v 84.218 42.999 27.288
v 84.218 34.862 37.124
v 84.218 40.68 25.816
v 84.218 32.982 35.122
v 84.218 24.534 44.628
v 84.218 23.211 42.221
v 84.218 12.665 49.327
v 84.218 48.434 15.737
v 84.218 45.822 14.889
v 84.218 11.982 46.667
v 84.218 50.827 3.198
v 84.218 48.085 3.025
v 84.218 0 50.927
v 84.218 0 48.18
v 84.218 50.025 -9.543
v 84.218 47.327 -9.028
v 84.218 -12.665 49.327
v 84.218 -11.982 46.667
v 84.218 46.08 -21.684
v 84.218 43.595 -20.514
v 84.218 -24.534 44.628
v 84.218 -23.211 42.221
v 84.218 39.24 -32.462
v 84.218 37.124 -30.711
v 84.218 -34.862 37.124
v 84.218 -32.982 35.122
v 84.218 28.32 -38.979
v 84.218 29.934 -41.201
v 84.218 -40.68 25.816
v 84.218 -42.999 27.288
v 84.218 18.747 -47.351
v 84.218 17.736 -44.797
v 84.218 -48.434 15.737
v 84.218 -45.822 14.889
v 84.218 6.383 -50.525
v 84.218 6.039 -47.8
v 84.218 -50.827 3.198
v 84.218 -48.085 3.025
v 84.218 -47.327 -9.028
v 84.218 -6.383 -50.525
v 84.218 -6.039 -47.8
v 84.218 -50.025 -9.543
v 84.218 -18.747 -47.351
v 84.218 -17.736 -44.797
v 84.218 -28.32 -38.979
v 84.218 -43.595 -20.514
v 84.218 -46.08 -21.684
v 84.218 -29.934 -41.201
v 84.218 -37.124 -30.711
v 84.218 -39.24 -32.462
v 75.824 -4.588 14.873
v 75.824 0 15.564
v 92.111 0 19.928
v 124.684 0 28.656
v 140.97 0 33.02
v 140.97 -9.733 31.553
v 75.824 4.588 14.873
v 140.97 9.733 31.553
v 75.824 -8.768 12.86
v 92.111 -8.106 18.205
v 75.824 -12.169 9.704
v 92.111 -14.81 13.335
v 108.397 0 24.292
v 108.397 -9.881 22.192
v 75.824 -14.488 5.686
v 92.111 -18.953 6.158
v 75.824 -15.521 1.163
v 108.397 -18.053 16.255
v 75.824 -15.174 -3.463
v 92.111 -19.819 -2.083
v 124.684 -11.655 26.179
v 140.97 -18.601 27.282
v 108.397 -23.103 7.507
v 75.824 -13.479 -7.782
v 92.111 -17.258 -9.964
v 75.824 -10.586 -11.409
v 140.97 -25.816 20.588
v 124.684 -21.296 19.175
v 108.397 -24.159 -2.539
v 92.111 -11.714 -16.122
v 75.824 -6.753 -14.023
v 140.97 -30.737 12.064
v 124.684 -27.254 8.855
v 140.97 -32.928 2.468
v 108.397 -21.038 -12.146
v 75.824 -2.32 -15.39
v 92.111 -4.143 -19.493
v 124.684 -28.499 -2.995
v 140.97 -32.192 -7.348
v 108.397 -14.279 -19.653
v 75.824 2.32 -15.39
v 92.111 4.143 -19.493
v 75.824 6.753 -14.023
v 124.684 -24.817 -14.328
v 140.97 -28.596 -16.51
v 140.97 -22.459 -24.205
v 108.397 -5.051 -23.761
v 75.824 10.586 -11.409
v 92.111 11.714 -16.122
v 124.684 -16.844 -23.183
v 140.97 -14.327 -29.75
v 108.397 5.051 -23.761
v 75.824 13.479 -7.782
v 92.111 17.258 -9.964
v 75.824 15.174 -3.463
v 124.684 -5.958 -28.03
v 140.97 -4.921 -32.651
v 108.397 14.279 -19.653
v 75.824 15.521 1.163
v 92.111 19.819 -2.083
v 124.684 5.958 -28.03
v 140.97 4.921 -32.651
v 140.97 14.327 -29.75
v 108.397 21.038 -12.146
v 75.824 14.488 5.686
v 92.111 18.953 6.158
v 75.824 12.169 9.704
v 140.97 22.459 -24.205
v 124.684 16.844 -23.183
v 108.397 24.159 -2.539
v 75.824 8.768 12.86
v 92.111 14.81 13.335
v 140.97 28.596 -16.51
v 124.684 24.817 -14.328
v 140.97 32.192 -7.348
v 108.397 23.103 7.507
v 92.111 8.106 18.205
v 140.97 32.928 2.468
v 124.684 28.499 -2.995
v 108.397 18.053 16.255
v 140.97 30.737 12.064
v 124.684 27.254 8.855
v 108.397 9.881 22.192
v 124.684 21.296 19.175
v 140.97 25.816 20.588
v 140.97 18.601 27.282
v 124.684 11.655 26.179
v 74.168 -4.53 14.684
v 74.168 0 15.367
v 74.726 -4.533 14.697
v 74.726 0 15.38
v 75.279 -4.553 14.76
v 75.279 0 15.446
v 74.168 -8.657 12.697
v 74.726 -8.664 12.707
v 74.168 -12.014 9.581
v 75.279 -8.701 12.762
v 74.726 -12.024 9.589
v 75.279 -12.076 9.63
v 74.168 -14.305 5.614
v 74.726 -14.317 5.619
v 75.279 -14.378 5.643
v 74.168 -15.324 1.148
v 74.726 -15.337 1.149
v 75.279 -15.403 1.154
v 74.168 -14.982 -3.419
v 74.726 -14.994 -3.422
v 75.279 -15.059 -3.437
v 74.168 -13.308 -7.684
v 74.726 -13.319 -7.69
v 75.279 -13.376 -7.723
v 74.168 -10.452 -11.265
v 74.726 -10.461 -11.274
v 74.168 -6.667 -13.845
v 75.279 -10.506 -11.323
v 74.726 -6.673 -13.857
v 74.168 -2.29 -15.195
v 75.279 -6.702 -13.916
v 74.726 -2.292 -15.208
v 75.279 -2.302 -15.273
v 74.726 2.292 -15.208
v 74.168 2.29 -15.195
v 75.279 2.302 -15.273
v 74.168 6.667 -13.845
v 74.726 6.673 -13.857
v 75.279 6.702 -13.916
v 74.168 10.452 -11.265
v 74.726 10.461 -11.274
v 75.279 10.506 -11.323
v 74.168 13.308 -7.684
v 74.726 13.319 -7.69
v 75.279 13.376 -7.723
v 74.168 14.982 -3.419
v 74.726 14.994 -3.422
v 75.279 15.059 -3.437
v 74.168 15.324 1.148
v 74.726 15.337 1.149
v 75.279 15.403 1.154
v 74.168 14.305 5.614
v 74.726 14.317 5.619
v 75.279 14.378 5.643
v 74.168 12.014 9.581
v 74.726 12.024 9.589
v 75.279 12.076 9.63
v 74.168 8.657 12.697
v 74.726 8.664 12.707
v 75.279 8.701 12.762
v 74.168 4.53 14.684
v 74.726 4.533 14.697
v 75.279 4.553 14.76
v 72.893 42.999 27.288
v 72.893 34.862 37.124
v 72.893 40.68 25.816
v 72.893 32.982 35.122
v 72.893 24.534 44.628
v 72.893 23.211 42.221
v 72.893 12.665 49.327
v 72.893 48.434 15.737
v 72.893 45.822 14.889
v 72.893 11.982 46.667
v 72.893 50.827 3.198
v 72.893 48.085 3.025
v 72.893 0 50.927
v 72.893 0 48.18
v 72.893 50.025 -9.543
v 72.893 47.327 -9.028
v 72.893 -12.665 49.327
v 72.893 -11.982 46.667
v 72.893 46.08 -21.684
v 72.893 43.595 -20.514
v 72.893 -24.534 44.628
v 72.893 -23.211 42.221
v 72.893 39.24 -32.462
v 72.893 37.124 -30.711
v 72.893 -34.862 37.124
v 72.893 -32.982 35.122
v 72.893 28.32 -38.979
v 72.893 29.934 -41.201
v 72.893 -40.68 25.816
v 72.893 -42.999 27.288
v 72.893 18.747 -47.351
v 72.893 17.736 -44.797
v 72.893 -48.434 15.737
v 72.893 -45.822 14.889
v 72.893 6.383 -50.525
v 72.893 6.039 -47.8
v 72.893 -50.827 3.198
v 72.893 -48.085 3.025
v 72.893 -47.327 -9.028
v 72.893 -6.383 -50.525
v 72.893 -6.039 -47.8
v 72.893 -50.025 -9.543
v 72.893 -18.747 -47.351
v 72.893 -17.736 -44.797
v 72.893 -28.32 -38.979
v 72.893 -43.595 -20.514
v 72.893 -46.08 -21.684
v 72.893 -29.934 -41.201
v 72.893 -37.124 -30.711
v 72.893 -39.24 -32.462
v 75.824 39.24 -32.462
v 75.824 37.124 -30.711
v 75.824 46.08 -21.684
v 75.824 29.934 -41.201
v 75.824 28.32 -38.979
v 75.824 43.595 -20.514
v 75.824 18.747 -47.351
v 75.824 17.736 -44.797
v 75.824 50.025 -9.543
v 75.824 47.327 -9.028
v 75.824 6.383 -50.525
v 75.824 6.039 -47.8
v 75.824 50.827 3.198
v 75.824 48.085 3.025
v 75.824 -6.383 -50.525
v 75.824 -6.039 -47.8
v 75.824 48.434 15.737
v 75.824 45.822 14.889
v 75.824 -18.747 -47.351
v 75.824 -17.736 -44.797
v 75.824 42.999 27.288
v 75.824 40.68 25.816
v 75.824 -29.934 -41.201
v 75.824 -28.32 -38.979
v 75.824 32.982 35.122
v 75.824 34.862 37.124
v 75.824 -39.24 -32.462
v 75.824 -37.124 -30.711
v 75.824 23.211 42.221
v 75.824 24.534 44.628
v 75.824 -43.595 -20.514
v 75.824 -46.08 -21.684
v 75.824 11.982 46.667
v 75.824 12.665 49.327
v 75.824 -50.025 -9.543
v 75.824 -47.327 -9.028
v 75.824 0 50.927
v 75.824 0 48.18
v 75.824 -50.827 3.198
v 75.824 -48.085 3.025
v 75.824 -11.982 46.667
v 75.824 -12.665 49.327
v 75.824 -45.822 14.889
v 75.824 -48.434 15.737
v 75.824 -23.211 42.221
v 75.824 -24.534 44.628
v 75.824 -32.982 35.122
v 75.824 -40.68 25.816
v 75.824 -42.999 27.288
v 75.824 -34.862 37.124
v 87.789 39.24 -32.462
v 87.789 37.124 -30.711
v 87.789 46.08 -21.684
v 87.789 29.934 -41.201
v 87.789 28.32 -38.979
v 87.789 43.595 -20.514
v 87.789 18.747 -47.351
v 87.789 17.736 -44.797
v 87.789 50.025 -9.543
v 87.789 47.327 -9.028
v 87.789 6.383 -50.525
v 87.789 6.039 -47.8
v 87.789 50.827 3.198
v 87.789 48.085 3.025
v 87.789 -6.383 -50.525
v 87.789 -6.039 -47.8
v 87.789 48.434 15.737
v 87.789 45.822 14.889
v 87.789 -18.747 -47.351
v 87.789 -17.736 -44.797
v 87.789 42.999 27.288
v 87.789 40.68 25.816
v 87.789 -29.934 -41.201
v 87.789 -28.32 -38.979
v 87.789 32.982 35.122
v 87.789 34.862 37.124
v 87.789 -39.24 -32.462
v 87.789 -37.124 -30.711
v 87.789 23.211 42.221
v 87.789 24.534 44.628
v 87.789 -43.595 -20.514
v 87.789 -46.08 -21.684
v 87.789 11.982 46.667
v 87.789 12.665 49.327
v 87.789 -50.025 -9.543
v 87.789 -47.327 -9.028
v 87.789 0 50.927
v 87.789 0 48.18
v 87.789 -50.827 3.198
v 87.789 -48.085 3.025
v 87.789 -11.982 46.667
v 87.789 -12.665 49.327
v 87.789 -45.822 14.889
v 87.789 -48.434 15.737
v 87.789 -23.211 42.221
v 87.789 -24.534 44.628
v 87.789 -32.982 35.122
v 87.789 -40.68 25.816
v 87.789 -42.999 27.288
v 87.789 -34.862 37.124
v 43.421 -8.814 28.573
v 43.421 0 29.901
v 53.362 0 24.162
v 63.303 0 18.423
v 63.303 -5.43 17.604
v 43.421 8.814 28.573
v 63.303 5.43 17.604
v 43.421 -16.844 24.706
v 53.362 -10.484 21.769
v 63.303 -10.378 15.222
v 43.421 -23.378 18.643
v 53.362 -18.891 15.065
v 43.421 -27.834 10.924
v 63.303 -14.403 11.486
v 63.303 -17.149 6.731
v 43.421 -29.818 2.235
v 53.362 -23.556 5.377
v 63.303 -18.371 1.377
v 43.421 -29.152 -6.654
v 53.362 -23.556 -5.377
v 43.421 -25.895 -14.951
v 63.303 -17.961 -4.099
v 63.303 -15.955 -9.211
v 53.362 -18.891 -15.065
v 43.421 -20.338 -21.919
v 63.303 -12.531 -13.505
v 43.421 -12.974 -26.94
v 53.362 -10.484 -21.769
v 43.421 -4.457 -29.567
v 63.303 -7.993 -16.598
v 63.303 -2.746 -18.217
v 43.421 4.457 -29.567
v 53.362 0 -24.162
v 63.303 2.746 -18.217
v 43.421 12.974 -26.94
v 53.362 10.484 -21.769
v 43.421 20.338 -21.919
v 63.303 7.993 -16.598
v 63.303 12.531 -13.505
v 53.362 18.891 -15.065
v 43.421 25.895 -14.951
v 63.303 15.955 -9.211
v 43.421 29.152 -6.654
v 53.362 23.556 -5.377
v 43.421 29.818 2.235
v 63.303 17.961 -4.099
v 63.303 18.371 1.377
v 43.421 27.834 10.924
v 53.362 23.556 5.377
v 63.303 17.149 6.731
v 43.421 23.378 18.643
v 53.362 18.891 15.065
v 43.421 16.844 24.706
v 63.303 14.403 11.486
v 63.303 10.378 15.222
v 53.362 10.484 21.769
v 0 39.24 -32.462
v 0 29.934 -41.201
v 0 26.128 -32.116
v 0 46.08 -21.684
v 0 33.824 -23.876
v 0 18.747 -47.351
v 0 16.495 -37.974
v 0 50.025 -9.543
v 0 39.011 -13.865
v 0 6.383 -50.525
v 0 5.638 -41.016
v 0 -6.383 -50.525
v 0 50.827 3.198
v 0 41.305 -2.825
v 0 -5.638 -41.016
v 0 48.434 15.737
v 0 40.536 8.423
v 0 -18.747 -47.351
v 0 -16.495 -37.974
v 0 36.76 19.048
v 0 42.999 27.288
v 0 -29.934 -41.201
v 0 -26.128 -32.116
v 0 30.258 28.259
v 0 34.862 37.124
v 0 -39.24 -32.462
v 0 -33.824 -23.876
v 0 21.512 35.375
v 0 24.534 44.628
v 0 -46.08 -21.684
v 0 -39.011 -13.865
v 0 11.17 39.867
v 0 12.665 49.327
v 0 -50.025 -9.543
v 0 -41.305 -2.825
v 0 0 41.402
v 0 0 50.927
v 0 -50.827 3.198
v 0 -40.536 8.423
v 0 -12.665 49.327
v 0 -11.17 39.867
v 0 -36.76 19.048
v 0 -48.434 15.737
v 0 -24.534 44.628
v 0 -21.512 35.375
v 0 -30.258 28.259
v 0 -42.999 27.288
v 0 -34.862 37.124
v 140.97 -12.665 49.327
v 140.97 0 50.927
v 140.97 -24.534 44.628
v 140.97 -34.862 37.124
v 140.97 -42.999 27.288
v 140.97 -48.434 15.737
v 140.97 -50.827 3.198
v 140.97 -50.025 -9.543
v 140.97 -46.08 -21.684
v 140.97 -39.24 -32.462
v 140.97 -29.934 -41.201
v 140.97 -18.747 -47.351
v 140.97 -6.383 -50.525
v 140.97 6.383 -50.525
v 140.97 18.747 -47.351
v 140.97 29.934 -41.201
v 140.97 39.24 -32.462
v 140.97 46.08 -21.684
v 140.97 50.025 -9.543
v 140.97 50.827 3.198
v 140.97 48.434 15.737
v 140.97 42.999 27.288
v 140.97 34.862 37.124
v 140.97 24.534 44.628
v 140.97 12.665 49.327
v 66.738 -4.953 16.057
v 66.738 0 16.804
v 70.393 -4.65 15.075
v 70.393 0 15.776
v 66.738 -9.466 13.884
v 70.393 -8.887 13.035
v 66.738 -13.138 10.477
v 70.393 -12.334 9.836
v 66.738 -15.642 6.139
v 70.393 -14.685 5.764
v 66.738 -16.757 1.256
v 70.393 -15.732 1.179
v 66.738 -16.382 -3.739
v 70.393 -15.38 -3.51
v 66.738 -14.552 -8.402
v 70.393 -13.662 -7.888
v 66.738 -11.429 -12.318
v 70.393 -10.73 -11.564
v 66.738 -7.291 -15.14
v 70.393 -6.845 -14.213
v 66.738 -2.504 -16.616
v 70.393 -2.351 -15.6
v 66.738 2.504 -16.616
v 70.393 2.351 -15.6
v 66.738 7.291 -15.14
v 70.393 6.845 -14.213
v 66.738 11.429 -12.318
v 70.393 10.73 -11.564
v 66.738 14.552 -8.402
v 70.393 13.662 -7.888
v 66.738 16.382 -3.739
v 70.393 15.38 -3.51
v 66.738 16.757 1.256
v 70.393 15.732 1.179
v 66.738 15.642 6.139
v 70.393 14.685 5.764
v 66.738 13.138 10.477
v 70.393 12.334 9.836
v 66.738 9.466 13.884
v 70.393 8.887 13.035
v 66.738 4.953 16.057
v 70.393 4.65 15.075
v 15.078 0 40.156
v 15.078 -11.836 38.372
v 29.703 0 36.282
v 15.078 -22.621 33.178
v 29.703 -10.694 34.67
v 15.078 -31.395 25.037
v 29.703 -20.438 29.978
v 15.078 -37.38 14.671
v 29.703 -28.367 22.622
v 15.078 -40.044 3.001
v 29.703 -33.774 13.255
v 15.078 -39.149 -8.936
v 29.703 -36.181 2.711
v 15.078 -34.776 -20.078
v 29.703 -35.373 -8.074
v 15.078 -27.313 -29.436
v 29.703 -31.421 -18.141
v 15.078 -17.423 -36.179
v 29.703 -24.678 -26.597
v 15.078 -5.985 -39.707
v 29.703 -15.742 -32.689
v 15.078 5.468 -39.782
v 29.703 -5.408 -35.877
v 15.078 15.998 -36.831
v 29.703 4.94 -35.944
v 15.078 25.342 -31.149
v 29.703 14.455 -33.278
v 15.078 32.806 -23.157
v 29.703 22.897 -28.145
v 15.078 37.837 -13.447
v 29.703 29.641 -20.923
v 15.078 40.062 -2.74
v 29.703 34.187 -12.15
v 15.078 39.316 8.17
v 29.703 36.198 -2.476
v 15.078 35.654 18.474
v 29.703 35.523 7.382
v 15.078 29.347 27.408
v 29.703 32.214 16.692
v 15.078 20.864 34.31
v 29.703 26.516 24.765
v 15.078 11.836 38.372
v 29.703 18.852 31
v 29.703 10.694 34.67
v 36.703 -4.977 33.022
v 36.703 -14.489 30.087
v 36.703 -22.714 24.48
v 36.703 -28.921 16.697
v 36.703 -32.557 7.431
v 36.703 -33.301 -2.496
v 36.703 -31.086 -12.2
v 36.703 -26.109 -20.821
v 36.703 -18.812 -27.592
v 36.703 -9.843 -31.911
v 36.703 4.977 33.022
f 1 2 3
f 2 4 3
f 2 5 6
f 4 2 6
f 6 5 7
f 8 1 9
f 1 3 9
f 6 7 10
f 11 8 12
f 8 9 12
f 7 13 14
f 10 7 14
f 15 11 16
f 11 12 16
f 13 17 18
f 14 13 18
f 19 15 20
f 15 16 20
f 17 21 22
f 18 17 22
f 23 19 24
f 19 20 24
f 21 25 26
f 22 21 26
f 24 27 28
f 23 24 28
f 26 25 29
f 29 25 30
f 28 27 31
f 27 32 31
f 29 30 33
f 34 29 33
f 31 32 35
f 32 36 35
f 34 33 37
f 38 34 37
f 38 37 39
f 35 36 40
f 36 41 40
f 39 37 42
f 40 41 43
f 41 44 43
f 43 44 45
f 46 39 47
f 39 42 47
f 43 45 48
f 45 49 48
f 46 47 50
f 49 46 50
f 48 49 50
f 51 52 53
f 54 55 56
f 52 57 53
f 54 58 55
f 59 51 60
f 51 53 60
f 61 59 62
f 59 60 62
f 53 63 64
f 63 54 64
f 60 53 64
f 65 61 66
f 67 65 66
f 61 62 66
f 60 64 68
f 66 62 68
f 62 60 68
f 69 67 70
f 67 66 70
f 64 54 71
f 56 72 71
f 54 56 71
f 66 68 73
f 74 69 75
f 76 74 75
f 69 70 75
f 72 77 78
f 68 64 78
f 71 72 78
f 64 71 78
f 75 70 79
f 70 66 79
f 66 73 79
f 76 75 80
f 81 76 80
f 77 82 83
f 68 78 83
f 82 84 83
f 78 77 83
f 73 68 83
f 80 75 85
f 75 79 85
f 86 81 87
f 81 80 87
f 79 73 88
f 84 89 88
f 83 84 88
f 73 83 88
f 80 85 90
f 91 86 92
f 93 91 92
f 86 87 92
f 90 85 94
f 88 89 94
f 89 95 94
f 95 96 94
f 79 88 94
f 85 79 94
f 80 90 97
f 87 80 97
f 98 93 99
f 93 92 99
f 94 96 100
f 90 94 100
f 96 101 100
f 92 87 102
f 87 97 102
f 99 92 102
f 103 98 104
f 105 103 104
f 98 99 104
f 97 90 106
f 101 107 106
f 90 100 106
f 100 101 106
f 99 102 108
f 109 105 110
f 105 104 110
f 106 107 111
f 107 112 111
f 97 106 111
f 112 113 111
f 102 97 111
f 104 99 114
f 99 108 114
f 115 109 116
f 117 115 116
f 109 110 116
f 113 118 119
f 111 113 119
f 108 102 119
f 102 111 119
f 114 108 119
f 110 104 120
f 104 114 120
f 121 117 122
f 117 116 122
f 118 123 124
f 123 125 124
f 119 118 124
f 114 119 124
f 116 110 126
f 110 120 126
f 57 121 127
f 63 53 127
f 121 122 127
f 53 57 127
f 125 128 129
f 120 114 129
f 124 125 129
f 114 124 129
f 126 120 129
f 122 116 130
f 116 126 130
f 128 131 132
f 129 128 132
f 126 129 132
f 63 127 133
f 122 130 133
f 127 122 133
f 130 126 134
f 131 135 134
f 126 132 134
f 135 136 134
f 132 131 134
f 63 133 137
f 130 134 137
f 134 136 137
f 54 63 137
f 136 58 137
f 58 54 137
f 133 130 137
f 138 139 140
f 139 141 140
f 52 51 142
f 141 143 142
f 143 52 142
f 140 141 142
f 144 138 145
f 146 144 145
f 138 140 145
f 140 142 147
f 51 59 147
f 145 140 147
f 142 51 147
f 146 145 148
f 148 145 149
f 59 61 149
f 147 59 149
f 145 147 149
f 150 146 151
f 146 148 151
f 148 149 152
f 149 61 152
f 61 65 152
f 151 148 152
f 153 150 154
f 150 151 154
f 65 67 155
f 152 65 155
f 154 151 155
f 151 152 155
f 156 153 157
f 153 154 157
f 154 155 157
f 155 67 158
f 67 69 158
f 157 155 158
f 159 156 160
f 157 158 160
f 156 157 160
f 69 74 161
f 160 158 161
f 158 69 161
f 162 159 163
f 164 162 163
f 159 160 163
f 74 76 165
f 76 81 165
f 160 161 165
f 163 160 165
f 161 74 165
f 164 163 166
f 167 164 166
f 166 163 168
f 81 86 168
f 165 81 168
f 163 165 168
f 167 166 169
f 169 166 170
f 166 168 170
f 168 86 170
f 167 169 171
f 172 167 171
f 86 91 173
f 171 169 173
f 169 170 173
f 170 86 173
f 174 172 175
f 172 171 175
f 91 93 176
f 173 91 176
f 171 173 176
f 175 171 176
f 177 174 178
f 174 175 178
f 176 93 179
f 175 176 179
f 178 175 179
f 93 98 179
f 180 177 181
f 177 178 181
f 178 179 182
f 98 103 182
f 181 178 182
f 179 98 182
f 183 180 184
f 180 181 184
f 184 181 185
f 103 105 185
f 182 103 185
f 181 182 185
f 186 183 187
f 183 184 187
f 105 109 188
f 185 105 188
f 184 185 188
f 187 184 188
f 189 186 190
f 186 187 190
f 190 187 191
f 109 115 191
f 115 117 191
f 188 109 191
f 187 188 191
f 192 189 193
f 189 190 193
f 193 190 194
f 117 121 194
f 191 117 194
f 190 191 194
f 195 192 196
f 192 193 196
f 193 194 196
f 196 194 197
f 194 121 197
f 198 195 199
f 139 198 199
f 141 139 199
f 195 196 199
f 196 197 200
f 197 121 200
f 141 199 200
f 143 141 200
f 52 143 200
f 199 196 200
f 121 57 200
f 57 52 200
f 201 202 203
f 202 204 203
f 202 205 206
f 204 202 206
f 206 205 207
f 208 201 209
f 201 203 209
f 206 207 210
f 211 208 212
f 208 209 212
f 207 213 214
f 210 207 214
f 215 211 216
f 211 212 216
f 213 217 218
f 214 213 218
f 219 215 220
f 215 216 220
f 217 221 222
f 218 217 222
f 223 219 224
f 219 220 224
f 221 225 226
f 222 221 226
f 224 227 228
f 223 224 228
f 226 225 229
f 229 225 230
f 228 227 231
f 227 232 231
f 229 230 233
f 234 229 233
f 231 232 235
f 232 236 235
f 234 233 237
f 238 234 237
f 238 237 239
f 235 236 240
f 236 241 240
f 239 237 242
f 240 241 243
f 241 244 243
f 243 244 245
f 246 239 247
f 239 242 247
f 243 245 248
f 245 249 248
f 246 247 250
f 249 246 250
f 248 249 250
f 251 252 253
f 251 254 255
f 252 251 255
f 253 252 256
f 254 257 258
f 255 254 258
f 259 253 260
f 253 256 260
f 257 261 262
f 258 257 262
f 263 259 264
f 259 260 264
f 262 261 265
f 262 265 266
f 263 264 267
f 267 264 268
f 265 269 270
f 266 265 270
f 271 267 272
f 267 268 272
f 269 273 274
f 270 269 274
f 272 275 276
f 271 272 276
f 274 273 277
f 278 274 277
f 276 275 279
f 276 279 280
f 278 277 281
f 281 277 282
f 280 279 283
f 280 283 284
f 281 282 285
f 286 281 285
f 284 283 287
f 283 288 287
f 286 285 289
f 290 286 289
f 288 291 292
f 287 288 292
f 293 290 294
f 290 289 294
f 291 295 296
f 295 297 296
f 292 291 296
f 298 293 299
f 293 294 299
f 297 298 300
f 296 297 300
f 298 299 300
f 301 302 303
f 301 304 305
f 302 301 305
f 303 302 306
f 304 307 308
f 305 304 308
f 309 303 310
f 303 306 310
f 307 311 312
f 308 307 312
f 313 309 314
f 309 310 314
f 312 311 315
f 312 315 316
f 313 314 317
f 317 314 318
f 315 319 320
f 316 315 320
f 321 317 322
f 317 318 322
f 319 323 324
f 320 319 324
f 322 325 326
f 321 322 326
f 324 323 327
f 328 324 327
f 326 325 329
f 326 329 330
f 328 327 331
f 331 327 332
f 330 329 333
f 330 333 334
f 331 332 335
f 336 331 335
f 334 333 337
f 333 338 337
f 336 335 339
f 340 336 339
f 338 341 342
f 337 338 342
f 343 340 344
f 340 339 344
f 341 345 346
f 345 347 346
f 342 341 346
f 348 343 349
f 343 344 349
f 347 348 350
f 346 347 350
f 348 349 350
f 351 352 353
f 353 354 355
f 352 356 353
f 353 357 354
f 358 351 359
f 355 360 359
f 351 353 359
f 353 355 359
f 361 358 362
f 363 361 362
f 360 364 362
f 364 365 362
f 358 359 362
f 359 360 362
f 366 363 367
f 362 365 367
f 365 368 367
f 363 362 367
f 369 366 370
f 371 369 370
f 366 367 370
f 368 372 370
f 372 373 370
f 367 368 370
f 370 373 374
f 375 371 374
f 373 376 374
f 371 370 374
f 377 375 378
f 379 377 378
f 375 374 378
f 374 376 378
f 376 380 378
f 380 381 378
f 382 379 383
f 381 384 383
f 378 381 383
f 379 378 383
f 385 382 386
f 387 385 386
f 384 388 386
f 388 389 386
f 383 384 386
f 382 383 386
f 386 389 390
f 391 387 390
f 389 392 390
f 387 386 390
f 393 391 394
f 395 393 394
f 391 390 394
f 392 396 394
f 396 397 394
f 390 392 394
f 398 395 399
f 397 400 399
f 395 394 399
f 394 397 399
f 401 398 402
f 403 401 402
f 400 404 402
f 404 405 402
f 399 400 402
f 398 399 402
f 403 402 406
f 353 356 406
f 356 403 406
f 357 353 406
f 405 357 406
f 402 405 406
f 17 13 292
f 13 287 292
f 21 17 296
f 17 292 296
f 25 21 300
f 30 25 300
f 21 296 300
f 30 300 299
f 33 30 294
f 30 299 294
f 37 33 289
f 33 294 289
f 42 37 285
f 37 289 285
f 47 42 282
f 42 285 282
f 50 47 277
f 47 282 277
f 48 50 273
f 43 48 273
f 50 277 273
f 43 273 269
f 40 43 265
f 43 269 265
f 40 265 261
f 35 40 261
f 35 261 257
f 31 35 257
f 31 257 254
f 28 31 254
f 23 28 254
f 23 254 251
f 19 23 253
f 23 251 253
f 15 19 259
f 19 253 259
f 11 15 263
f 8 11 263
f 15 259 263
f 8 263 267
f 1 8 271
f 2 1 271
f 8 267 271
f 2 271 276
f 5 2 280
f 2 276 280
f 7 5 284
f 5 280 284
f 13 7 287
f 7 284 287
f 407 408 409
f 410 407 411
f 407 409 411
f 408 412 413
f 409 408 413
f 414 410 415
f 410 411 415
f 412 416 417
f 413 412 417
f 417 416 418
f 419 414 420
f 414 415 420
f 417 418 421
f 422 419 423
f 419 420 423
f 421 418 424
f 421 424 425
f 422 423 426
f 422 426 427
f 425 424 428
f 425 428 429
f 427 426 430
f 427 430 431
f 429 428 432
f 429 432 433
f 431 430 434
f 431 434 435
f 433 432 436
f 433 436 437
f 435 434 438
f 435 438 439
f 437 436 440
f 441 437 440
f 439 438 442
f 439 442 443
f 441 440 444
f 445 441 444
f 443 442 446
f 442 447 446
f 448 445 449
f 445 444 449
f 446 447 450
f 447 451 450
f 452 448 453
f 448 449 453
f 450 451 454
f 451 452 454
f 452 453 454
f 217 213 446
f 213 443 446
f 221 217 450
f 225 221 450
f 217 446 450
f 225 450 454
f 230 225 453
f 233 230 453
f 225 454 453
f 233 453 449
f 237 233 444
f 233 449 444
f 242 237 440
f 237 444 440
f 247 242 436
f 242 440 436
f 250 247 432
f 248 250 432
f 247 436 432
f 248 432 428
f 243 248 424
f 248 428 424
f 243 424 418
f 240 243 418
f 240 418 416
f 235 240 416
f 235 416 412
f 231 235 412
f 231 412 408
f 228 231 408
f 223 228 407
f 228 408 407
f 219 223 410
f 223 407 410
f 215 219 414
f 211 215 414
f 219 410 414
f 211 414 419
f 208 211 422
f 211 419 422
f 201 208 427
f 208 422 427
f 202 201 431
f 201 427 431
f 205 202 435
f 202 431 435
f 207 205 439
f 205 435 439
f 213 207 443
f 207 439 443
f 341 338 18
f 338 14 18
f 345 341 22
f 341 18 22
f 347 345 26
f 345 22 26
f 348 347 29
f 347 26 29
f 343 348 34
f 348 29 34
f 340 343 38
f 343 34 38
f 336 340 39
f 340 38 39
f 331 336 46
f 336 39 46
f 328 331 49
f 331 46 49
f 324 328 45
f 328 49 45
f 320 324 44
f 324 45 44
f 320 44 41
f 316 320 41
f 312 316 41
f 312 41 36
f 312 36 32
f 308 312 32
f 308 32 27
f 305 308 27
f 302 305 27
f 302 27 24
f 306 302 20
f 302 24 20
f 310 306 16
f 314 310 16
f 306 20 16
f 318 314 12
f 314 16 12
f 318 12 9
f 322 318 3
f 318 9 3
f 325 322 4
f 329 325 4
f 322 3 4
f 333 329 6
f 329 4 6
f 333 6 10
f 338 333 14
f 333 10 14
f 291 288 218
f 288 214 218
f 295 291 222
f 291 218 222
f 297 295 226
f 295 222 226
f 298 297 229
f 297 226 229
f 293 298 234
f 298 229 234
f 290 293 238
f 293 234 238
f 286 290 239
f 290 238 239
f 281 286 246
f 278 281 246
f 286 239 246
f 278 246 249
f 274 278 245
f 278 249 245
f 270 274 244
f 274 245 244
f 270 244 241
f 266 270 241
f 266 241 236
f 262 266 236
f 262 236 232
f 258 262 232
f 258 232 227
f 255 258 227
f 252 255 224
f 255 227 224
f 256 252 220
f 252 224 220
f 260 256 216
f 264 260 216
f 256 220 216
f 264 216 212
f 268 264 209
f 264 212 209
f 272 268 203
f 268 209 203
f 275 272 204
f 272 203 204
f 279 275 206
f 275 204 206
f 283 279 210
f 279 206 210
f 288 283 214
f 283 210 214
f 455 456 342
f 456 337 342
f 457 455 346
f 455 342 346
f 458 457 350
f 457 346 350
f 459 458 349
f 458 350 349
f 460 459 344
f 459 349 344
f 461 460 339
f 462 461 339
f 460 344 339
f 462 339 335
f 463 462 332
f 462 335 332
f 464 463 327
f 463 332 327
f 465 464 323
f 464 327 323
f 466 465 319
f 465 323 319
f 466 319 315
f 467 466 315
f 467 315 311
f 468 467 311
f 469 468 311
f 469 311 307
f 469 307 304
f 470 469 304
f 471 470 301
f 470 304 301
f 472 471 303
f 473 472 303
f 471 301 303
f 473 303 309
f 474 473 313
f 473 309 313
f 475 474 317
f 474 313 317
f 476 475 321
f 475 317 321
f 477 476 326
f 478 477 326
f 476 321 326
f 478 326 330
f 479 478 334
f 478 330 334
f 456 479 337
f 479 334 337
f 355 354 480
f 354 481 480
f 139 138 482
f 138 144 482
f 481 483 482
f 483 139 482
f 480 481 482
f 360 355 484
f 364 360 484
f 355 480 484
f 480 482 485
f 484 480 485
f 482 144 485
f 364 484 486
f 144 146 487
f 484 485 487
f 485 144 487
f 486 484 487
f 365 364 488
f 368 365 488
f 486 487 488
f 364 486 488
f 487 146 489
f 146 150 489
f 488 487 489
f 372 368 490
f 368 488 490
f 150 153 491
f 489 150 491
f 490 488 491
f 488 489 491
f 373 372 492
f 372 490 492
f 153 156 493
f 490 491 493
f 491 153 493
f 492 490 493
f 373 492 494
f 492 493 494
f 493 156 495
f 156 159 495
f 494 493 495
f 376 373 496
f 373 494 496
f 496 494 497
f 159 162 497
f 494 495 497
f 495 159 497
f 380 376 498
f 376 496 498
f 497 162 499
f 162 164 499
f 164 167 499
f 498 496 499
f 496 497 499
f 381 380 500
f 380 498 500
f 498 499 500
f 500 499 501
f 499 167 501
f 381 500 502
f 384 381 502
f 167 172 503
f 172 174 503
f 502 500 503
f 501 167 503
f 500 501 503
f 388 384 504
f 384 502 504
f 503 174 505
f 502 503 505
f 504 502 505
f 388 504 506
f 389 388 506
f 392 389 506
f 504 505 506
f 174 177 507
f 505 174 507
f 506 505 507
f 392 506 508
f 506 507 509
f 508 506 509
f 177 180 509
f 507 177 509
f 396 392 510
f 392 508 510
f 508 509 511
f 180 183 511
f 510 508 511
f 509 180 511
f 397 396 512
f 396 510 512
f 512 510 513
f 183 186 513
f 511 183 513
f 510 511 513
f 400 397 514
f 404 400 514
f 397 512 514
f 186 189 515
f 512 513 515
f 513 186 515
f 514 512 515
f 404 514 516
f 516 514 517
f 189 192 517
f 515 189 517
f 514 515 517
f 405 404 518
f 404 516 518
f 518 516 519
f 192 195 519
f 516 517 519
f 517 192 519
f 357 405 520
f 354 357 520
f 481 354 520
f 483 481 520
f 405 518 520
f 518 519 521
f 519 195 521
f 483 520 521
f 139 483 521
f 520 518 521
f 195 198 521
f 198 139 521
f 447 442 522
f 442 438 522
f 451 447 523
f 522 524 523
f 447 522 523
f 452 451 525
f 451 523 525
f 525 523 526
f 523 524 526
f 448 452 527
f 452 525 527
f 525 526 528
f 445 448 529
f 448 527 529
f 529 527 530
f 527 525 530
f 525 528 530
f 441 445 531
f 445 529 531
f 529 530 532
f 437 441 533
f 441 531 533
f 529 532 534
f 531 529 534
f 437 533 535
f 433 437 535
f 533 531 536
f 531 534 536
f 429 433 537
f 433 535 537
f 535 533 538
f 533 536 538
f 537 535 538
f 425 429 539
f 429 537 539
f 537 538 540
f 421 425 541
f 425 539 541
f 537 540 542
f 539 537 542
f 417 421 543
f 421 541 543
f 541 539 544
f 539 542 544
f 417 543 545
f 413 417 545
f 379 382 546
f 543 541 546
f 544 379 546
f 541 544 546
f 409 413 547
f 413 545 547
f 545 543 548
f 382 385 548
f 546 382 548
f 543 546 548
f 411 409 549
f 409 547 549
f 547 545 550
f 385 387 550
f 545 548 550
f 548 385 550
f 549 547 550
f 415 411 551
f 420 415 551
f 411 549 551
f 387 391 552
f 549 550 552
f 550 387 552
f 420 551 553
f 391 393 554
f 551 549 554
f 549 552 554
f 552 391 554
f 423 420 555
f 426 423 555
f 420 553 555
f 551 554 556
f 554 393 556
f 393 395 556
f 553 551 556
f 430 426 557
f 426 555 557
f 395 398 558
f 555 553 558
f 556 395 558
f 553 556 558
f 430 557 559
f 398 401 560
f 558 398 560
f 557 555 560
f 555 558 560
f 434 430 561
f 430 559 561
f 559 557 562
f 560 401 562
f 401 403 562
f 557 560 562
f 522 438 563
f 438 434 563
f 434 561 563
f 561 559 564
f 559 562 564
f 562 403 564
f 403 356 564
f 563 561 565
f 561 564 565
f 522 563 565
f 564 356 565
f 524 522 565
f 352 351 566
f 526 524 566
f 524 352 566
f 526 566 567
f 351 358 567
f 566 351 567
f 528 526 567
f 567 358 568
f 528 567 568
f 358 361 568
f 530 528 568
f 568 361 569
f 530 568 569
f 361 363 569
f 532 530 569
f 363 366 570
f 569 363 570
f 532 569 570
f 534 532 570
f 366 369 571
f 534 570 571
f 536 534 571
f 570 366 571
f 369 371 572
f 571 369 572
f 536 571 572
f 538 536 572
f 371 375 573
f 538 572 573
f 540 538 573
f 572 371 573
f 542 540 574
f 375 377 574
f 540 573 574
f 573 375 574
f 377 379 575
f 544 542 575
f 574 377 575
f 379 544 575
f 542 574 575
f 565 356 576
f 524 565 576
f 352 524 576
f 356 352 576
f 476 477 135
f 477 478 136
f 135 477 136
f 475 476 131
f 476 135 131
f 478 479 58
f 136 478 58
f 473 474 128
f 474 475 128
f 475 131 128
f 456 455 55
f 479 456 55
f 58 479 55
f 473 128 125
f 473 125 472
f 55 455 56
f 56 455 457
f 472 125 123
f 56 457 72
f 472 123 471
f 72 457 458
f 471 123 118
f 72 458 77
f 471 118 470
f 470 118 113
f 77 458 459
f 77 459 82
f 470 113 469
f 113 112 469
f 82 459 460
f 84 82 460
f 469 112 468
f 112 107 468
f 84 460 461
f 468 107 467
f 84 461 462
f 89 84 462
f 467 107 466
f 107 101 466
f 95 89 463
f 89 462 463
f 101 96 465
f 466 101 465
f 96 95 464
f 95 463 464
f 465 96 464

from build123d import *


with BuildPart() as part:
    # Sketch1 → Revolve1 (revolve)
    with BuildSketch(Plane.XY, mode=Mode.PRIVATE) as revolve1_sk:
        with BuildLine():
            Line((43.421005762, 29.901440031), (63.302799643, 18.422680981))
            ThreePointArc((63.302799643, 18.422680981), (68.543849717, 16.213738545), (74.168, 15.367))
            ThreePointArc((74.168, 15.367), (75.003256616, 15.406217174), (75.824358548, 15.564277983))
            Line((75.824358548, 15.564277983), (140.97, 33.02))
            Line((140.97, 33.02), (140.97, 50.927))
            Line((140.97, 50.927), (87.788503876, 50.927))
            Line((87.788503876, 50.927), (87.788503876, 48.180233369))
            Line((87.788503876, 48.180233369), (84.218492297, 48.180233369))
            Line((84.218492297, 48.180233369), (84.218492297, 50.927))
            Line((84.218492297, 50.927), (75.824358548, 50.927))
            Line((75.824358548, 50.927), (75.824358548, 48.180233369))
            Line((75.824358548, 48.180233369), (72.892938323, 48.180233369))
            Line((72.892938323, 48.180233369), (72.892938323, 50.927))
            Line((72.892938323, 50.927), (0, 50.927))
            Line((0, 50.927), (0, 41.402))
            ThreePointArc((0, 41.402), (22.475975666, 38.541805218), (43.421005762, 29.901440031))
        make_face()
    revolve(revolve1_sk.sketch.rotate(Axis((0, 0, 0), (1, 0, 0)), 90), axis=Axis((0, 0, 0), (1, 0, 0)))


solid = part.part
